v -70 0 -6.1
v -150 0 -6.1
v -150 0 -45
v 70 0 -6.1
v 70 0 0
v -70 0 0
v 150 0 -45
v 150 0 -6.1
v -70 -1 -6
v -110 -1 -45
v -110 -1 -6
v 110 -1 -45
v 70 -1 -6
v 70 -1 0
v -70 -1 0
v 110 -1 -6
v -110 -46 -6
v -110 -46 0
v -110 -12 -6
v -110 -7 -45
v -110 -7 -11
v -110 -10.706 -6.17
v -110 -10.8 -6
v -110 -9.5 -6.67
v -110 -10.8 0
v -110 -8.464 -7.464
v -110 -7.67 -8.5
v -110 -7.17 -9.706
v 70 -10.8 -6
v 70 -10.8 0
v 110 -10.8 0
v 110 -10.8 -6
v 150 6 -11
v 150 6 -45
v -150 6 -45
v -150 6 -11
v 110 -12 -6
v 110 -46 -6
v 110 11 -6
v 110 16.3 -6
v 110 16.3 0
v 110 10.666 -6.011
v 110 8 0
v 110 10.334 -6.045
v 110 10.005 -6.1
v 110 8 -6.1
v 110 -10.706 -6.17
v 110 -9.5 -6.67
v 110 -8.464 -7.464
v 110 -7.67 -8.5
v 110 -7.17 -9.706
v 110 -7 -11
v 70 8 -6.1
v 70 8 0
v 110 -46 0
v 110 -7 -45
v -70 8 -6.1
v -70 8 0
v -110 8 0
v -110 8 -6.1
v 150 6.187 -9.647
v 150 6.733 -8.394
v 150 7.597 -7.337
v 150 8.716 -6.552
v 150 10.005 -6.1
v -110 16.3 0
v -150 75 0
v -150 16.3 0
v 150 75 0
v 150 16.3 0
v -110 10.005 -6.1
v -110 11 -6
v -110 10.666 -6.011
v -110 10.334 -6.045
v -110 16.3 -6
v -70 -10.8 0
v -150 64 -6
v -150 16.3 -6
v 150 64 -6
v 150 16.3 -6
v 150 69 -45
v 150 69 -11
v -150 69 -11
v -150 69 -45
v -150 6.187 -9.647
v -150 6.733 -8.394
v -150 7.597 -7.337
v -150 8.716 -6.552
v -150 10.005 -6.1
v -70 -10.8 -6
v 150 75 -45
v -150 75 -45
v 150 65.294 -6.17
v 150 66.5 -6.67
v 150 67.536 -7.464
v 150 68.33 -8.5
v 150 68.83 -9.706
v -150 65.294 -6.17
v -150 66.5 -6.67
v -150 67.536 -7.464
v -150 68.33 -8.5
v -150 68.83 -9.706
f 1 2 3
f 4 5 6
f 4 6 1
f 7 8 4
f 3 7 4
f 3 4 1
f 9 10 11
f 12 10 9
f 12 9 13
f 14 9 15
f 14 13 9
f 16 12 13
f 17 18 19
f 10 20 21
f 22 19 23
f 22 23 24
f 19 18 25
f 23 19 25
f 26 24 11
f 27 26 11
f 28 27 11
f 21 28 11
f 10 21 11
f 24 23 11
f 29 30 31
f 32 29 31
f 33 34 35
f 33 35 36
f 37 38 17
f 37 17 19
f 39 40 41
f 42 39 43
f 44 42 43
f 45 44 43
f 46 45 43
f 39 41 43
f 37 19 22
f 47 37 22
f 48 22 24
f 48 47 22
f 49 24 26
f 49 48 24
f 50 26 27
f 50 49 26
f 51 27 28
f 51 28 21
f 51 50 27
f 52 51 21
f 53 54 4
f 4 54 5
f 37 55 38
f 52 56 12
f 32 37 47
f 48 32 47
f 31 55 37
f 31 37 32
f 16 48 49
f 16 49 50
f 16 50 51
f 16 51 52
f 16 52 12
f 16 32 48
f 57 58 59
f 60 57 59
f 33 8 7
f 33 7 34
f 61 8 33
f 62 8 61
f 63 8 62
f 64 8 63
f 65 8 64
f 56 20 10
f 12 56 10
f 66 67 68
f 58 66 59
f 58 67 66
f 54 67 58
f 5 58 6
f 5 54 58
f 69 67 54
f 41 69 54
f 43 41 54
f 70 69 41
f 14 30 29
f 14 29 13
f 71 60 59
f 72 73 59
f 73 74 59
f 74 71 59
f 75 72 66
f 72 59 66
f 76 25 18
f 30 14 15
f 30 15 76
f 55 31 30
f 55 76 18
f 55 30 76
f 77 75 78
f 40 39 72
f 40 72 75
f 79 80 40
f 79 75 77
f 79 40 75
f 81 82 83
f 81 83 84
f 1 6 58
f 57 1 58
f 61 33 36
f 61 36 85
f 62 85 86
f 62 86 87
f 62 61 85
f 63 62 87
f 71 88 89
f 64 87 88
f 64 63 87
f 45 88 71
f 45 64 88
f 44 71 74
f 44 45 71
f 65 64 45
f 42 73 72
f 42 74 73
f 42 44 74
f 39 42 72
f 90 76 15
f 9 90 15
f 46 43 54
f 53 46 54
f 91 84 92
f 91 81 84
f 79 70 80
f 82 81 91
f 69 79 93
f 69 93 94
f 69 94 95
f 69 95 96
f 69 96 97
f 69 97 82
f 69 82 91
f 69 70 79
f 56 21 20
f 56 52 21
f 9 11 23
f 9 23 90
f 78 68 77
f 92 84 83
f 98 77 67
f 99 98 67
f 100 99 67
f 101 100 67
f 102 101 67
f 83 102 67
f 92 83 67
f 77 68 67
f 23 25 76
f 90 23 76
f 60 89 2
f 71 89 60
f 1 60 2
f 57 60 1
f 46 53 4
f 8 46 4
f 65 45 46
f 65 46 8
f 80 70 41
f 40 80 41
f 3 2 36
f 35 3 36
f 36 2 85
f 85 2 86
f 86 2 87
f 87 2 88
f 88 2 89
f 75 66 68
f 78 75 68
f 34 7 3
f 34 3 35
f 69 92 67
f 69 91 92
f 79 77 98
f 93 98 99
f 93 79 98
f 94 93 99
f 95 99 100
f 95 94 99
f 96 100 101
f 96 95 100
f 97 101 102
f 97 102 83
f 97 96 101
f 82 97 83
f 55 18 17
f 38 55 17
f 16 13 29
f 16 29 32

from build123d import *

# Parameters (mm, degrees)
F2_DEPTH      = 150
F2_DEPTH_BACK = 150
F5_DEPTH      = 110
F5_DEPTH_BACK = 110
F7_DEPTH      = 6.1
F8_W          = 40
F8_H          = 9.8
F9_DEPTH      = 6


with BuildPart() as f2:
    # F1 (on Right) → F2 (new body, two sides)
    with BuildSketch(Plane.YZ) as f2_sk:
        with BuildLine():
            Line((75, 0), (0, 0))
            Line((0, 0), (0, -45))
            Line((0, -45), (6, -45))
            Line((6, -45), (6, -11))
            ThreePointArc((6, -11), (7.464466, -7.464466), (11, -6))
            Line((11, -6), (64, -6))
            ThreePointArc((64, -6), (67.535534, -7.464466), (69, -11))
            Line((69, -11), (69, -45))
            Line((69, -45), (75, -45))
            Line((75, -45), (75, 0))
        make_face()
    extrude(amount=F2_DEPTH)
    extrude(f2_sk.sketch, amount=-F2_DEPTH_BACK)

    # F6 (on face) → F7 (cut)
    with BuildSketch(Plane.XY):
        Polygon((-150, 16.3), (-150, 0), (-110, 0), (-70, 0), (-70, 8), (-110, 8), (-110, 16.3), align=None)
        Polygon((110, 0), (150, 0), (150, 16.3), (110, 16.3), (110, 8), (70, 8), (70, 0), align=None)
    extrude(amount=-F7_DEPTH, mode=Mode.SUBTRACT)


with BuildPart() as f5:
    # F4 (on Right) → F5 (new body, two sides)
    with BuildSketch(Plane.YZ) as f5_sk:
        with BuildLine():
            Line((-1, -45), (-1, 0))
            Line((-1, 0), (-46, 0))
            Line((-46, 0), (-46, -6))
            Line((-46, -6), (-12, -6))
            ThreePointArc((-12, -6), (-8.464466, -7.464466), (-7, -11))
            Line((-7, -11), (-7, -45))
            Line((-7, -45), (-1, -45))
        make_face()
    extrude(amount=F5_DEPTH)
    extrude(f5_sk.sketch, amount=-F5_DEPTH_BACK)

    # F8 (on face) → F9 (cut)
    with BuildSketch(Plane.XY):
        with Locations((-90, -5.9)):
            Rectangle(F8_W, F8_H)
        with Locations((90, -5.9)):
            Rectangle(F8_W, F8_H)
    extrude(amount=-F9_DEPTH, mode=Mode.SUBTRACT)


solid = Compound([f2.part, f5.part])
